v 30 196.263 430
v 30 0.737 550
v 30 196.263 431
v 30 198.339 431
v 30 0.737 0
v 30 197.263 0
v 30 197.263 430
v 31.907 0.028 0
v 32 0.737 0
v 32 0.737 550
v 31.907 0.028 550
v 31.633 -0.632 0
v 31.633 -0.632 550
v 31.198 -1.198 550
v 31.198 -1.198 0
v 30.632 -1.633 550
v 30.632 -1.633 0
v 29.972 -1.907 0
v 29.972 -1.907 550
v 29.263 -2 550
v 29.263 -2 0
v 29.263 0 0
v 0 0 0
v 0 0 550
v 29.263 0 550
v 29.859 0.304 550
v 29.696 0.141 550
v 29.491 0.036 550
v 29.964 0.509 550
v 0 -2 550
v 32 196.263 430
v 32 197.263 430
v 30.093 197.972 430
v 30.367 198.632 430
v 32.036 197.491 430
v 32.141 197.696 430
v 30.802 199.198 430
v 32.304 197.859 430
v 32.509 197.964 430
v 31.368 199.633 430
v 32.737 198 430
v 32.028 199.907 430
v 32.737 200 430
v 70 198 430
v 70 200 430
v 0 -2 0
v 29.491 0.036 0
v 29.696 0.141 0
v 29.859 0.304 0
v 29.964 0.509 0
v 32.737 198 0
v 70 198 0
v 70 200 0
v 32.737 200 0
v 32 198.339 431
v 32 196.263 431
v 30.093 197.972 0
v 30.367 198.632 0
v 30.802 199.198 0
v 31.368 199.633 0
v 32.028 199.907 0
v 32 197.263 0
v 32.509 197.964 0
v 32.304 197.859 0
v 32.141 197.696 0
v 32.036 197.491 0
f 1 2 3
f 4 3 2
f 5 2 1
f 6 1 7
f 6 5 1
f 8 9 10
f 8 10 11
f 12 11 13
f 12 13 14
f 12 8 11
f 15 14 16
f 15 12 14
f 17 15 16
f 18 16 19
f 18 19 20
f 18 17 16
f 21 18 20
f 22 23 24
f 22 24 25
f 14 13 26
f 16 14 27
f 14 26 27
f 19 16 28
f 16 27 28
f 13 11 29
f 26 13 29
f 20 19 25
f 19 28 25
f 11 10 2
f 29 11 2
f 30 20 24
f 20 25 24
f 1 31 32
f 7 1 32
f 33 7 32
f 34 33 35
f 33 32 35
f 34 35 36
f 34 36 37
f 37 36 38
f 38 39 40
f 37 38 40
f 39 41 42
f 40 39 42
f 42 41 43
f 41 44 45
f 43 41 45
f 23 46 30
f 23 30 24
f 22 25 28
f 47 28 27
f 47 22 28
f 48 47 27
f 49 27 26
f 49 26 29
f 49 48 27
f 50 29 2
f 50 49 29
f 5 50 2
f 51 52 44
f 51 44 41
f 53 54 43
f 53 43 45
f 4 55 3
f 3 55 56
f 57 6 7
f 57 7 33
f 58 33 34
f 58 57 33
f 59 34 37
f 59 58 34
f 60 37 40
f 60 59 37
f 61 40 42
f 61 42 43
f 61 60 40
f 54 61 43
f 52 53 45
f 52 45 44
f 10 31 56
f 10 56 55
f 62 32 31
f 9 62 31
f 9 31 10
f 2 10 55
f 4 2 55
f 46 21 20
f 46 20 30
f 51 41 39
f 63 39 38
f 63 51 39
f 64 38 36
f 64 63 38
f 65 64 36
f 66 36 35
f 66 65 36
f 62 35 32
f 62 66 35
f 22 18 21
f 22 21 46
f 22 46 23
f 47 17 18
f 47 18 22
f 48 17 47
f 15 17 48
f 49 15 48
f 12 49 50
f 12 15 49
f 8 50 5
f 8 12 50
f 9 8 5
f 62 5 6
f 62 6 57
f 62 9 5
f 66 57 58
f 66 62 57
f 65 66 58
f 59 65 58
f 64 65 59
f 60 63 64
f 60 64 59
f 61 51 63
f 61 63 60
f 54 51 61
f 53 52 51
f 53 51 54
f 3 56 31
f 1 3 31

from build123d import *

# Parameters (mm, degrees)
BASE_FLANGE1_DEPTH            = 550
CUT_EXTRUDE1_REACH            = 588.109
EDGE_FLANGE1_STRIP_W          = 9.4732
EDGE_FLANGE1_STRIP_H          = 2
EDGE_FLANGE1_STRIP_CUT_DEPTH  = 430
EDGE_FLANGE1_RELIEF_W         = 10.4732
EDGE_FLANGE1_RELIEF_H         = 1
EDGE_FLANGE1_RELIEF_CUT_DEPTH = 2
EDGE_FLANGE1_DEPTH            = 430


# Sheet-metal steps are written as plain solids
with BuildPart() as part:
    # Sketch1 → Base-Flange1 (new body)
    with BuildSketch(Plane.XY):
        with BuildLine():
            Line((0, 0), (29.2634, 0))
            ThreePointArc((29.2634, 0), (29.784254855, 0.215745145), (30, 0.7366))
            Line((30, 0.7366), (30, 200))
            Line((30, 200), (32, 200))
            Line((32, 200), (32, 0.7366))
            ThreePointArc((32, 0.7366), (31.198468417, -1.198468417), (29.2634, -2))
            Line((29.2634, -2), (0, -2))
            Line((0, -2), (0, 0))
        make_face()
    extrude(amount=BASE_FLANGE1_DEPTH)

    # Sketch6 → Cut-Extrude1 (cut, up to next)
    with BuildSketch(Plane(origin=(32, 0, 0), x_dir=(0, 0, -1), z_dir=(1, 0, 0)), mode=Mode.PRIVATE) as cut_extrude1_sk1:
        Polygon((-550, 0.7366), (-430, 200), (-550, 200), align=None)
    cut_extrude1_tool1 = extrude(cut_extrude1_sk1.sketch, amount=-CUT_EXTRUDE1_REACH, mode=Mode.PRIVATE) & part.part
    add(cut_extrude1_tool1.solids().sort_by_distance((32, 133.578867, 510))[0], mode=Mode.SUBTRACT)

    # Edge-Flange1 strip (across the edge) → Edge-Flange1 strip cut (cut)
    with BuildSketch(Plane(origin=(32, 200, 0), x_dir=(0, -1, 0), z_dir=(0, 0, 1))):
        with Locations((-2, -1)):
            Rectangle(EDGE_FLANGE1_STRIP_W, EDGE_FLANGE1_STRIP_H)
    extrude(amount=EDGE_FLANGE1_STRIP_CUT_DEPTH, mode=Mode.SUBTRACT)

    # Edge-Flange1 relief (on the sheet) → Edge-Flange1 relief cut (cut)
    with BuildSketch(Plane(origin=(32, 197.2634, 0), x_dir=(0, -1, 0), z_dir=(1, 0, 0))):
        with Locations((-4.2366, -430.5)):
            Rectangle(EDGE_FLANGE1_RELIEF_W, EDGE_FLANGE1_RELIEF_H)
    extrude(amount=-EDGE_FLANGE1_RELIEF_CUT_DEPTH, mode=Mode.SUBTRACT)

    # Edge-Flange1 section (across the edge) → Edge-Flange1 (add)
    with BuildSketch(Plane(origin=(32, 200, 0), x_dir=(0, -1, 0), z_dir=(0, 0, 1))):
        with BuildLine():
            Line((0, 0.7366), (0, 38))
            Line((0, 38), (2, 38))
            Line((2, 38), (2, 0.7366))
            ThreePointArc((2, 0.7366), (2.215745145, 0.215745145), (2.7366, 0))
            Line((2.7366, 0), (2.7366, -2))
            ThreePointArc((2.7366, -2), (0.801531583, -1.198468417), (0, 0.7366))
        make_face()
    extrude(amount=EDGE_FLANGE1_DEPTH)


solid = part.part
